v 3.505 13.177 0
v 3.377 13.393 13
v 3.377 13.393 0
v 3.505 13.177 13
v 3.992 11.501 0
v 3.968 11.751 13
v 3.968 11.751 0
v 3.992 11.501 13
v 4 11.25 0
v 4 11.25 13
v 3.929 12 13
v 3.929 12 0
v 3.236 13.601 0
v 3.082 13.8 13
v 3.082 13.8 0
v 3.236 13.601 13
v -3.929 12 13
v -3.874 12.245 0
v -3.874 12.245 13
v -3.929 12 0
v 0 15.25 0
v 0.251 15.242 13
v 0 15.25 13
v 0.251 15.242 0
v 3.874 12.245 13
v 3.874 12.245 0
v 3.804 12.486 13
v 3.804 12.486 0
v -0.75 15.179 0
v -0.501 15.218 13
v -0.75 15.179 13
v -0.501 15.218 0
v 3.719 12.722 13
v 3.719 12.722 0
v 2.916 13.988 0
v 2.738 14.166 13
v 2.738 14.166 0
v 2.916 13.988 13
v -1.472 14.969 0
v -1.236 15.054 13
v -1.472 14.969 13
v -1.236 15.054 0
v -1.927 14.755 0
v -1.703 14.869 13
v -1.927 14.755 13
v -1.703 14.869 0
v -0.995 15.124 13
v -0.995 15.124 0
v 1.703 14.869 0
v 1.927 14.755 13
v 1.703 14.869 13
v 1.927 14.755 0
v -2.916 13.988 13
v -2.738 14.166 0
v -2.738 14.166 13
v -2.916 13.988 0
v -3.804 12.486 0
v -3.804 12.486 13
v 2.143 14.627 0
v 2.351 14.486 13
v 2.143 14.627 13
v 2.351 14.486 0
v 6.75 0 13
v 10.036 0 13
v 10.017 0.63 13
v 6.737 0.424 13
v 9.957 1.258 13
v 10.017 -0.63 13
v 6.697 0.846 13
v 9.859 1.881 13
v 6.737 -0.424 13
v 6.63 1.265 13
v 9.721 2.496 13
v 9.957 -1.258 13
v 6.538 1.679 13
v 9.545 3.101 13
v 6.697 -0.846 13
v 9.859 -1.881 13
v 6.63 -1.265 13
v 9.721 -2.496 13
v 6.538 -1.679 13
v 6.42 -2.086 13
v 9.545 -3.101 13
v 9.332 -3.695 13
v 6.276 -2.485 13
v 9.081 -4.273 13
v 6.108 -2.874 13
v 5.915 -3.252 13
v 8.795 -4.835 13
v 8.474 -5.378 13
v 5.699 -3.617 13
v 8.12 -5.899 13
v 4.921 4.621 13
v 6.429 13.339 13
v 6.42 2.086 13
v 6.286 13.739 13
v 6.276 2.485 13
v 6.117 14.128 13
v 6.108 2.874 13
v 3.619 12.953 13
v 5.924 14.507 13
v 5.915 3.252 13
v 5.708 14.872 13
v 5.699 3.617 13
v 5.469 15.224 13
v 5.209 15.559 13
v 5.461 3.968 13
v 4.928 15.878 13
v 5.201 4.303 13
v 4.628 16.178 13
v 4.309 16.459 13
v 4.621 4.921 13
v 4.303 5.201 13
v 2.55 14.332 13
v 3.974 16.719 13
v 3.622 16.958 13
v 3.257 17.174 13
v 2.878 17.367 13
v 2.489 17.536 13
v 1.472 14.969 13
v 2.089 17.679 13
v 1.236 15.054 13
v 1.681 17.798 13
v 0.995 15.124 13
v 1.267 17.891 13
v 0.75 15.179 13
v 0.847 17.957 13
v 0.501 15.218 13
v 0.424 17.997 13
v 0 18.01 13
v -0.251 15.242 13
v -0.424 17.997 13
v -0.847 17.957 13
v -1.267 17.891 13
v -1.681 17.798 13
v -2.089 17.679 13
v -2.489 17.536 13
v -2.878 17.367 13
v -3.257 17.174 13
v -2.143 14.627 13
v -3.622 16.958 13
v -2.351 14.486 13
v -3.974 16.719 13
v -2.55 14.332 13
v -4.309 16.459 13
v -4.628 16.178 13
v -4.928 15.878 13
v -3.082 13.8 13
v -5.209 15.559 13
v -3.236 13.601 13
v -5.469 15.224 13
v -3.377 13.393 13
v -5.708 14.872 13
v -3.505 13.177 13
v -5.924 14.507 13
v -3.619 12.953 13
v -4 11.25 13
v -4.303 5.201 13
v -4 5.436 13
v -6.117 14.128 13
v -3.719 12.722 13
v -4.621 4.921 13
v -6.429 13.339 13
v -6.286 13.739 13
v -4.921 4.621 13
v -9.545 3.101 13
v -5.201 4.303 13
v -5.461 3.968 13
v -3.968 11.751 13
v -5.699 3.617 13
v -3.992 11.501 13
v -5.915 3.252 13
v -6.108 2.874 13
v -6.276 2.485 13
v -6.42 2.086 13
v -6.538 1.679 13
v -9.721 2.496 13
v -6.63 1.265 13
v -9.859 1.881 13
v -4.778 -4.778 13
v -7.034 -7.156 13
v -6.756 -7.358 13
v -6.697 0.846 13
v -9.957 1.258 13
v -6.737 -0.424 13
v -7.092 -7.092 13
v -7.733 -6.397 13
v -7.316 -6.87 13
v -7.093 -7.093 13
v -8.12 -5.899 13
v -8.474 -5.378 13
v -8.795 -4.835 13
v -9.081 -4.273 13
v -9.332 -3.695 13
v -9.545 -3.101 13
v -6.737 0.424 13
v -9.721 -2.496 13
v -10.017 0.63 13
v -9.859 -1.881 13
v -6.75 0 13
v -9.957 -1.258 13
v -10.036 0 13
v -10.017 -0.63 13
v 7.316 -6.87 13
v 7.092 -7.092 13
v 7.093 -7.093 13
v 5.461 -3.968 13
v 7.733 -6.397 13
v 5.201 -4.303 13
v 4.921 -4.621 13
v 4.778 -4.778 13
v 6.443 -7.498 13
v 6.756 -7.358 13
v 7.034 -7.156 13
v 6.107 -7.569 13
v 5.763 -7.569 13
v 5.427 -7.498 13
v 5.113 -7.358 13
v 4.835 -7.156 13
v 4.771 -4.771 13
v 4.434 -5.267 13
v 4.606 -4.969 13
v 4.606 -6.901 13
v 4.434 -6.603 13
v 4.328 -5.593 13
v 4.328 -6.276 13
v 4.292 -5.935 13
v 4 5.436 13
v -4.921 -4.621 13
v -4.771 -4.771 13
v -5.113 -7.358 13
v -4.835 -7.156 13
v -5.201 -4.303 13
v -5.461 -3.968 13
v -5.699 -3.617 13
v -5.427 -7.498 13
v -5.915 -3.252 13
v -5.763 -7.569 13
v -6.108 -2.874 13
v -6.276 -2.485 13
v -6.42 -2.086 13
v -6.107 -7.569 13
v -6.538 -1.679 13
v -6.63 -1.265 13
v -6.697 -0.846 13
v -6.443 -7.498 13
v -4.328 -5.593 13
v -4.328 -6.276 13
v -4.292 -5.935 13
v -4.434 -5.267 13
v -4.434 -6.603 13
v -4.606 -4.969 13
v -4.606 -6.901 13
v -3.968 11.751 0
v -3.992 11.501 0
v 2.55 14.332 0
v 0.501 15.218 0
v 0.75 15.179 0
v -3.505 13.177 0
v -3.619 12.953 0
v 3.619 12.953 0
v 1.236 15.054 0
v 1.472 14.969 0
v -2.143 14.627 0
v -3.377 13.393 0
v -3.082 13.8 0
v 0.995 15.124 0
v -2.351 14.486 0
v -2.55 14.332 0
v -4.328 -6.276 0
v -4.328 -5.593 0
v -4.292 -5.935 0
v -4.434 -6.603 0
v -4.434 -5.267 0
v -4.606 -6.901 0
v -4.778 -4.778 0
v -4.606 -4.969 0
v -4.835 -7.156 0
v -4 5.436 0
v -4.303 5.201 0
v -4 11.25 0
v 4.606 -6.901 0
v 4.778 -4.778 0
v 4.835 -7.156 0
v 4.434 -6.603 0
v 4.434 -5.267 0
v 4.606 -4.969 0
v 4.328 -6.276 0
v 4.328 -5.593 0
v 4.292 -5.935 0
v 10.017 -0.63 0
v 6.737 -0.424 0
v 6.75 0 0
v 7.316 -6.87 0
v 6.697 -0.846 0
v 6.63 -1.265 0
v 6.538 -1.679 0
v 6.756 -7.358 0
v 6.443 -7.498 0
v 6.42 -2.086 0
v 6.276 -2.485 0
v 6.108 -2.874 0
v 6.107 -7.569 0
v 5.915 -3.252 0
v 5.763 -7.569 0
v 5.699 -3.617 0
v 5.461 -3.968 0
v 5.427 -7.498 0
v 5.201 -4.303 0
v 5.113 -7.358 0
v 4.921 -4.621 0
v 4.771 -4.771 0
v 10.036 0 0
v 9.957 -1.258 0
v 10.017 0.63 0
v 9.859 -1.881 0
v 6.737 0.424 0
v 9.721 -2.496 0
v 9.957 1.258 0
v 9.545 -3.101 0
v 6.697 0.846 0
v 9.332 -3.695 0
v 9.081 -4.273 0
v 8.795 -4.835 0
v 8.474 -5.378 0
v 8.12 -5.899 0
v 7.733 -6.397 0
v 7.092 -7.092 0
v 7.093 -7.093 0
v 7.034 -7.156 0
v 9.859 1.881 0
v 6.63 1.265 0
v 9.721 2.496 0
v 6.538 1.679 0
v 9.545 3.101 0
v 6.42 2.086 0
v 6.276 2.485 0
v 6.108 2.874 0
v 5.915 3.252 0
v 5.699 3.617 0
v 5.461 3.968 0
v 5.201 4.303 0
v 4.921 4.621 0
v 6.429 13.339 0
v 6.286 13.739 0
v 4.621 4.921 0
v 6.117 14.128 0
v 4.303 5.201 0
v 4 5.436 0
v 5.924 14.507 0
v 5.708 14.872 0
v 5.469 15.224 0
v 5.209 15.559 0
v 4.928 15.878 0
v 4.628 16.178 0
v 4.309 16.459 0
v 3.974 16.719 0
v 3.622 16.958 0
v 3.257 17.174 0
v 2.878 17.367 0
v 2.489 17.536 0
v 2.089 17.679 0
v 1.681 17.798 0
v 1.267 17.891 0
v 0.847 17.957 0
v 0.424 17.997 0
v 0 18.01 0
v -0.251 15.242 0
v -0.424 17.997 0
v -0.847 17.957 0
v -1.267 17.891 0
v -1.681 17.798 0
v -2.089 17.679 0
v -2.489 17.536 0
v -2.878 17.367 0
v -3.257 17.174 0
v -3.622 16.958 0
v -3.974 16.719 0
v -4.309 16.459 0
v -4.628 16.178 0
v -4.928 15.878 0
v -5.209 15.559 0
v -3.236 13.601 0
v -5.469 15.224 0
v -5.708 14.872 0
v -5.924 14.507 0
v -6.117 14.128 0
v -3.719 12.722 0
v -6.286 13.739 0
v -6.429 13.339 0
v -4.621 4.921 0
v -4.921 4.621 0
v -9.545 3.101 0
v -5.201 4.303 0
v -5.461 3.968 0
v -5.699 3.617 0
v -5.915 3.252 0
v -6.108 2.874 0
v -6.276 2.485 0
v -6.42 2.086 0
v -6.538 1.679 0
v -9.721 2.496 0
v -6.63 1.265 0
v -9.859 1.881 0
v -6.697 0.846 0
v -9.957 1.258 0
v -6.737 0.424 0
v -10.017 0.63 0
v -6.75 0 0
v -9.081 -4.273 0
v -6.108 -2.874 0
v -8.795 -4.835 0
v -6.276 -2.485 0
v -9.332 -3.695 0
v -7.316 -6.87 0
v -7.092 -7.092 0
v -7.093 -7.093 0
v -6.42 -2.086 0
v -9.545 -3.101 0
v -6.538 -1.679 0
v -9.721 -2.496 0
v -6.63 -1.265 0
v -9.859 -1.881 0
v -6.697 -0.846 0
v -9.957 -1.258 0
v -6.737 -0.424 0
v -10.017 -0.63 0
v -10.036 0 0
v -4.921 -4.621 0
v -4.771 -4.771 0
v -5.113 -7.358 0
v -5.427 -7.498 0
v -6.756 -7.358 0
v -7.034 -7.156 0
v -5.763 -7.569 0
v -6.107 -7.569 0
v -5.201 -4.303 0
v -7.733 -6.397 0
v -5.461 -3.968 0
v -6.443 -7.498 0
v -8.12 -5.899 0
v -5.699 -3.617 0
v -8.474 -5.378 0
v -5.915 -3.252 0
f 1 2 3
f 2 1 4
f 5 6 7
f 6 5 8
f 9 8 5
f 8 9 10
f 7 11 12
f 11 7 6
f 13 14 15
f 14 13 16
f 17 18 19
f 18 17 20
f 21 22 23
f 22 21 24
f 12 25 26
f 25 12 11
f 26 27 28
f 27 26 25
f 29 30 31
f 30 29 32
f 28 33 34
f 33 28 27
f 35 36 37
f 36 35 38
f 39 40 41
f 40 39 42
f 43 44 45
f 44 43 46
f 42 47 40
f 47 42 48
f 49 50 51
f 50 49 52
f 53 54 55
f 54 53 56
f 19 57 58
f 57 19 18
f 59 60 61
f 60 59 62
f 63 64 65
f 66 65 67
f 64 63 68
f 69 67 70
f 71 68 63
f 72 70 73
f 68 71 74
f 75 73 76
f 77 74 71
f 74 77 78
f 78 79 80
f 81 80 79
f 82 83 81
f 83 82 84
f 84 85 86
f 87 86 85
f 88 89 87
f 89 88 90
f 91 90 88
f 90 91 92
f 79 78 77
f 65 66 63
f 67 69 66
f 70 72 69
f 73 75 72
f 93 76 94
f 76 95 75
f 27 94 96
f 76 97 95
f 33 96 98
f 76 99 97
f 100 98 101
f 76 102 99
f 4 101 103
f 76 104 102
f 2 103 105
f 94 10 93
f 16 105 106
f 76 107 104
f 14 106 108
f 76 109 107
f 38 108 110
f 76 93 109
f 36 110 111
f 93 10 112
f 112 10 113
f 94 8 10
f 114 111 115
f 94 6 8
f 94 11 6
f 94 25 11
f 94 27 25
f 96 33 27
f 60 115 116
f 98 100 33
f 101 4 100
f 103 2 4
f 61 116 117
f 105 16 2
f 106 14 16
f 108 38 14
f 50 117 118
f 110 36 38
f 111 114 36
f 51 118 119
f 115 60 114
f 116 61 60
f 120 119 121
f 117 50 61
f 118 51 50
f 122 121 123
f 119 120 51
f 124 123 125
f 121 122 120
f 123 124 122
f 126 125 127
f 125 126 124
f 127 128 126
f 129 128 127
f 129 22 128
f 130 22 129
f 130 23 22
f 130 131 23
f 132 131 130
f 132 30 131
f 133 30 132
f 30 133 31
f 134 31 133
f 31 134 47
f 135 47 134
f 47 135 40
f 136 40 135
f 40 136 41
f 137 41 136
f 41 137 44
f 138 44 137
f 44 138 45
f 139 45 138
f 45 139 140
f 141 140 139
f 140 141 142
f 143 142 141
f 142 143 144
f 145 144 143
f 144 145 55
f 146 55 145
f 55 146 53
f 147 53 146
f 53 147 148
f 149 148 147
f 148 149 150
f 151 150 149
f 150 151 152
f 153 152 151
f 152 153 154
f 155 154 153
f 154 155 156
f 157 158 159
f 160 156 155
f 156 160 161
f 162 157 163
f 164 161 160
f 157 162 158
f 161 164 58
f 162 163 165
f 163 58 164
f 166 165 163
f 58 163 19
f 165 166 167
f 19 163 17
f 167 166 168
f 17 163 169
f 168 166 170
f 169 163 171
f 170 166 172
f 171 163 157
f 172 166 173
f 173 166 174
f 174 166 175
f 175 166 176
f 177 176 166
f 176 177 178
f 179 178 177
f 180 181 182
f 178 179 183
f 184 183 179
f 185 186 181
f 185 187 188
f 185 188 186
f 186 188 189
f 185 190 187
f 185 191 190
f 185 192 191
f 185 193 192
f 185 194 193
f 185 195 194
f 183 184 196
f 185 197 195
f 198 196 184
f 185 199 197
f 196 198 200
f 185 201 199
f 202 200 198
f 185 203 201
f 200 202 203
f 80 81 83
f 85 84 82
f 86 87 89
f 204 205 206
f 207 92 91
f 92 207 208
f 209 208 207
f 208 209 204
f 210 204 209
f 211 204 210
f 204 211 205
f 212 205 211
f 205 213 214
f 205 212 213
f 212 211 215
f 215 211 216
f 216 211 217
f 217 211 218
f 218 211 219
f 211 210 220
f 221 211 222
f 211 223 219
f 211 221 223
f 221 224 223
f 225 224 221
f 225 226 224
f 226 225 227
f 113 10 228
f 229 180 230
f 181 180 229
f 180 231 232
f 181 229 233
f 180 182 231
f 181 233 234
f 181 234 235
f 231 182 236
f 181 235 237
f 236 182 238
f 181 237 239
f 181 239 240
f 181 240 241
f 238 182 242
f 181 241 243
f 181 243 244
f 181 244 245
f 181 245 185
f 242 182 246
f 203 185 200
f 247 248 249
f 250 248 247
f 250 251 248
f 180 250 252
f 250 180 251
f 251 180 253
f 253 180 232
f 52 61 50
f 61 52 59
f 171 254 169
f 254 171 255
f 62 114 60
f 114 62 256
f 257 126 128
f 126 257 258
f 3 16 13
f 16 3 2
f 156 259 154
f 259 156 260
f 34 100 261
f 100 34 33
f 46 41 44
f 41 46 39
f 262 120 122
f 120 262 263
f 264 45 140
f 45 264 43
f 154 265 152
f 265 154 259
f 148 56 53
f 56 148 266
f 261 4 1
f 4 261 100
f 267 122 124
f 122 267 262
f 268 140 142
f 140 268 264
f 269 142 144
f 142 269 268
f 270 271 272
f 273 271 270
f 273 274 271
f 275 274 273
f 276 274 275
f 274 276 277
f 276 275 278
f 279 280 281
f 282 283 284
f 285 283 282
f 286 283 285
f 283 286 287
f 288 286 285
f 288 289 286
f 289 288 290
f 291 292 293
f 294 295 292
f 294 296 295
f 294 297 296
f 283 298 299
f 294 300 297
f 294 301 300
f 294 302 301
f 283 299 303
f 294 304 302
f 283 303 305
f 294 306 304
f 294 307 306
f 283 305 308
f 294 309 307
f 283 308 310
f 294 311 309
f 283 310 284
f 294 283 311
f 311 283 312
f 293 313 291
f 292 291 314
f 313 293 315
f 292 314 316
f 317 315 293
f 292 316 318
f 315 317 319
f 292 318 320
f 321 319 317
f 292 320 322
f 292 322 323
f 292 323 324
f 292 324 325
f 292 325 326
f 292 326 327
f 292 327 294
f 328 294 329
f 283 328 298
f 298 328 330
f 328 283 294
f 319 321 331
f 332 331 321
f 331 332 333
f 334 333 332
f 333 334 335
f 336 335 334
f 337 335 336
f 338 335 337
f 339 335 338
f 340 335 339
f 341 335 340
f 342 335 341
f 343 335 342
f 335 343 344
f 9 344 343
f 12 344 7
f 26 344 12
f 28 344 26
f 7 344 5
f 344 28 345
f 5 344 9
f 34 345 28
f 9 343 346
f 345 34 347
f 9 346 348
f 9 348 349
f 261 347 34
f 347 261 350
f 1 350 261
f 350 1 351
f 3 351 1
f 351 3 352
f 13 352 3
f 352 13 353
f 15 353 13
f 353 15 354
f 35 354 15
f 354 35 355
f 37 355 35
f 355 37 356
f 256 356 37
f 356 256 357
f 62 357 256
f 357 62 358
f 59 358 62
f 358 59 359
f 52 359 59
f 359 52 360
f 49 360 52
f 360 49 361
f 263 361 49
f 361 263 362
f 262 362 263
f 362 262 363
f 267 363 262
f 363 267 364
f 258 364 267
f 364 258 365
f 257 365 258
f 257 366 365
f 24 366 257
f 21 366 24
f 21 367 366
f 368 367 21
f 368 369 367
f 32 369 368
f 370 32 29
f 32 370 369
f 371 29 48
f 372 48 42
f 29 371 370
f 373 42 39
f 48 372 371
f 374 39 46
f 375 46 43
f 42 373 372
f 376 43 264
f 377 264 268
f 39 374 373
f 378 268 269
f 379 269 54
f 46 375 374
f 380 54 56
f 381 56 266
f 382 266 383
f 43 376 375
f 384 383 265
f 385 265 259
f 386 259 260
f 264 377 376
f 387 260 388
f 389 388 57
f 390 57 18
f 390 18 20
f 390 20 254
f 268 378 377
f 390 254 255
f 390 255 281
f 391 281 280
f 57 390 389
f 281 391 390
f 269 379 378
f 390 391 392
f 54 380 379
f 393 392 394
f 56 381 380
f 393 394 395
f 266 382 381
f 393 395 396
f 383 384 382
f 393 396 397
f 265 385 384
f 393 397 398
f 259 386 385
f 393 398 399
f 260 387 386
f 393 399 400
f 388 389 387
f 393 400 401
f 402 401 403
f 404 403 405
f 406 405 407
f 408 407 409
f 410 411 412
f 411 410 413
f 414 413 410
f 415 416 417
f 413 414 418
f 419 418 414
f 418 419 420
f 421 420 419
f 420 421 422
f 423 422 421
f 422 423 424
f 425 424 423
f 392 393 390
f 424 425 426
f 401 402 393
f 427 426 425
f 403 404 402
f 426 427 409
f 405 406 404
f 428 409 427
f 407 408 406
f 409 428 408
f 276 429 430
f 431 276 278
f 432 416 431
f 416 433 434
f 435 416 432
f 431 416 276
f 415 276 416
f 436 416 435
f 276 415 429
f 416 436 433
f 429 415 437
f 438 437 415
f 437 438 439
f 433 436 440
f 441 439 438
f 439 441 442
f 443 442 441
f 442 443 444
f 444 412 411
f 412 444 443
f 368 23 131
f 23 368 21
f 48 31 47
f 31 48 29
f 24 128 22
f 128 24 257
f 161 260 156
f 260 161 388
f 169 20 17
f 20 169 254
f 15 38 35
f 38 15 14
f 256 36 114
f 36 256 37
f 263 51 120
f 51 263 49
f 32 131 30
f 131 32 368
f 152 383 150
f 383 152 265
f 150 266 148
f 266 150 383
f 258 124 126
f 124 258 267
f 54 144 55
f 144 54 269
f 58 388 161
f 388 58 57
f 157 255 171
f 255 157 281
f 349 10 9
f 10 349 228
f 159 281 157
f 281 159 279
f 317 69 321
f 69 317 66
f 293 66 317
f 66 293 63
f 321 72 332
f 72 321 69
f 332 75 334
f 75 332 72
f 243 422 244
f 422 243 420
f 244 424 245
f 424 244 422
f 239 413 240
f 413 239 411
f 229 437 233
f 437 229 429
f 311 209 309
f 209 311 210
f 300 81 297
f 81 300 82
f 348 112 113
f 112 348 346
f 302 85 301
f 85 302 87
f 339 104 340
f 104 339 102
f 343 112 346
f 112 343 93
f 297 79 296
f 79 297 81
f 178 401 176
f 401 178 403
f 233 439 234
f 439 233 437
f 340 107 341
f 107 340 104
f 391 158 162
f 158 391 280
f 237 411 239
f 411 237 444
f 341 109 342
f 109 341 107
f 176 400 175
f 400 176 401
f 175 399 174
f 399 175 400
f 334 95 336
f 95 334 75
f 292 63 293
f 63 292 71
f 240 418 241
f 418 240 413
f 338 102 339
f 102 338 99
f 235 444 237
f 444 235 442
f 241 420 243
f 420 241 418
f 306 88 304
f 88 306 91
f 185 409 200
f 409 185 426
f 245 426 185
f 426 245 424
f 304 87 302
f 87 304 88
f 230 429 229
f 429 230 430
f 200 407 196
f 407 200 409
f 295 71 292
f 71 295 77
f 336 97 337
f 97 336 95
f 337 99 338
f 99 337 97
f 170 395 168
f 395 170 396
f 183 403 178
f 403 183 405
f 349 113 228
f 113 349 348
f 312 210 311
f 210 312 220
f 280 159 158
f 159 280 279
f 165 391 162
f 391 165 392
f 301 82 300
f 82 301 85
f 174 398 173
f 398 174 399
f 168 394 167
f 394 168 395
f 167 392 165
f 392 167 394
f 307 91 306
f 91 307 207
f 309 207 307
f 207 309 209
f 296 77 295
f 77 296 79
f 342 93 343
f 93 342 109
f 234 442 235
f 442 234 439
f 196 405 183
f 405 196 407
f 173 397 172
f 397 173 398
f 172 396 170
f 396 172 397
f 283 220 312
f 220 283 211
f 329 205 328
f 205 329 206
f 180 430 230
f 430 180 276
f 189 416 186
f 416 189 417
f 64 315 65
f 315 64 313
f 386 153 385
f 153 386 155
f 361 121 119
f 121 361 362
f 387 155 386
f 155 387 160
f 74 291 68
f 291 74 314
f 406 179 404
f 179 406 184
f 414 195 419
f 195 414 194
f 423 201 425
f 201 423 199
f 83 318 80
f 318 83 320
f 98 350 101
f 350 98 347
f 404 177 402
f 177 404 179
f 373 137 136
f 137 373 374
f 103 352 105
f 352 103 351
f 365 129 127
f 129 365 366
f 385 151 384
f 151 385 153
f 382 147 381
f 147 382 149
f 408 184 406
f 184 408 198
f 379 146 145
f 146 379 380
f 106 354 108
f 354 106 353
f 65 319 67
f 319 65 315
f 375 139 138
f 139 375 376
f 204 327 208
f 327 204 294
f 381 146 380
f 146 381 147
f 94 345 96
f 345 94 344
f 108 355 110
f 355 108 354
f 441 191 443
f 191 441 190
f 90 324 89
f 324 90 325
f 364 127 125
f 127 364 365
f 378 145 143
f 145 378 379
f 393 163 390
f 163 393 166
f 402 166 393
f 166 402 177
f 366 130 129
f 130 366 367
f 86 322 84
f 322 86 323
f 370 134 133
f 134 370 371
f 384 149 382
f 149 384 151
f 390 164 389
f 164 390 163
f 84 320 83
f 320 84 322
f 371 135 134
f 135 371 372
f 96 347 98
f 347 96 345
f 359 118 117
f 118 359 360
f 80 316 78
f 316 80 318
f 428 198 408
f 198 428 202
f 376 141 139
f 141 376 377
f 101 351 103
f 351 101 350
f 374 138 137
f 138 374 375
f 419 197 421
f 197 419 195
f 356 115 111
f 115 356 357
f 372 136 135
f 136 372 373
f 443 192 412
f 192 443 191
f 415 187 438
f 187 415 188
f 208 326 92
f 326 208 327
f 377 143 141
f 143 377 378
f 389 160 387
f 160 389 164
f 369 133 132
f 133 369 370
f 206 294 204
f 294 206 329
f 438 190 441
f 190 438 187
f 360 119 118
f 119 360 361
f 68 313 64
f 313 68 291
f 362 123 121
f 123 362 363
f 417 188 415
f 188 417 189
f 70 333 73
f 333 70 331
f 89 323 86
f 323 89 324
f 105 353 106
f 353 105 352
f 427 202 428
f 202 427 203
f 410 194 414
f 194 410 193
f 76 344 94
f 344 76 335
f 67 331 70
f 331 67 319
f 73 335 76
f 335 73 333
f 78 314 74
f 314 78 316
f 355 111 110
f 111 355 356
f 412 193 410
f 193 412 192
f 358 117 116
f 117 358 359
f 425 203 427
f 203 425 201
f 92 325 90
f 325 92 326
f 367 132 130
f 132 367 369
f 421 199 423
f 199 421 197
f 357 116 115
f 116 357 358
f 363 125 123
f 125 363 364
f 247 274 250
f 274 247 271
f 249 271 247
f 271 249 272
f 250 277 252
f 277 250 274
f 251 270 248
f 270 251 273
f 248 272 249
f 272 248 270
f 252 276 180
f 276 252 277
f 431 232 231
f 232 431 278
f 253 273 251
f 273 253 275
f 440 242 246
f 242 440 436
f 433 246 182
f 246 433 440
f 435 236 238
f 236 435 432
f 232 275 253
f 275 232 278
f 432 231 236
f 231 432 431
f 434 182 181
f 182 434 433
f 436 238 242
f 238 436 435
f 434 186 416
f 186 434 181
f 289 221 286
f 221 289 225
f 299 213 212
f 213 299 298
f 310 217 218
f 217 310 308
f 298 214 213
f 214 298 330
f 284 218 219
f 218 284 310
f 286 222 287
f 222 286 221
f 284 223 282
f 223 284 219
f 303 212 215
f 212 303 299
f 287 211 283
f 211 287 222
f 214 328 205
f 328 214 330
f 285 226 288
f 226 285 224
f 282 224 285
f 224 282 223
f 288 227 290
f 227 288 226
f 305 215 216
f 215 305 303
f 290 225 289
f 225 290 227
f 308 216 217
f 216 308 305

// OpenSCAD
// (mm) – should be slightly smaller than the actual stand
stand_opening_diameter = 13.5;

// (mm) – should be at least the size of the cable
cable_opening_diameter = 8;

// (mm)
height = 13;

// (degrees)
clip_opening_angle = 90;


module clip(height, major, minor, opening_angle=90) {
    spacing = 0.5; // extra space for cable
    wall_major = pow(major / 20, 1/2) * 20 / 5;
    wall_minor = wall_major * pow(minor / major, 1/3);
    rounding = min(wall_major, wall_minor) - 0.01;

    // Distance between centers
    distance = major/2 + minor/2 + spacing;
    
    union() {
        $fn = 100;
        difference() {
            hull() {
                translate([0, distance])
                    cylinder(d=minor + 2 * wall_minor, h=height);
                cylinder(d=major + 2 * wall_major, h=height);
            }

            union() {
                translate([0, distance])
                    cylinder(d=minor, h=height);
                translate([0, distance / 2, height / 2])
                    cube([minor, distance, height], center=true);
                cylinder(d=major, h=height);
                
                linear_extrude(h=height) {
                    r = major + wall_major;
                    dx = r * sin(opening_angle / 2);
                    dy = -r * cos(opening_angle / 2);
                    polygon(points=[[0, 0],
                                     [dx, dy],
                                     [r, -r],
                                     [-r, -r],
                                     [-dx, dy]]);
                }
            }
        }
        
        r = major / 2 + wall_major / 2;
        dx = r * sin(opening_angle / 2);
        dy = -r * cos(opening_angle / 2);
        translate([-dx, dy]) cylinder(d=wall_major, h=height, $fn=30);
        translate([dx, dy]) cylinder(d=wall_major, h=height, $fn=30);
    }
}


clip(height, stand_opening_diameter, cable_opening_diameter, clip_opening_angle);
